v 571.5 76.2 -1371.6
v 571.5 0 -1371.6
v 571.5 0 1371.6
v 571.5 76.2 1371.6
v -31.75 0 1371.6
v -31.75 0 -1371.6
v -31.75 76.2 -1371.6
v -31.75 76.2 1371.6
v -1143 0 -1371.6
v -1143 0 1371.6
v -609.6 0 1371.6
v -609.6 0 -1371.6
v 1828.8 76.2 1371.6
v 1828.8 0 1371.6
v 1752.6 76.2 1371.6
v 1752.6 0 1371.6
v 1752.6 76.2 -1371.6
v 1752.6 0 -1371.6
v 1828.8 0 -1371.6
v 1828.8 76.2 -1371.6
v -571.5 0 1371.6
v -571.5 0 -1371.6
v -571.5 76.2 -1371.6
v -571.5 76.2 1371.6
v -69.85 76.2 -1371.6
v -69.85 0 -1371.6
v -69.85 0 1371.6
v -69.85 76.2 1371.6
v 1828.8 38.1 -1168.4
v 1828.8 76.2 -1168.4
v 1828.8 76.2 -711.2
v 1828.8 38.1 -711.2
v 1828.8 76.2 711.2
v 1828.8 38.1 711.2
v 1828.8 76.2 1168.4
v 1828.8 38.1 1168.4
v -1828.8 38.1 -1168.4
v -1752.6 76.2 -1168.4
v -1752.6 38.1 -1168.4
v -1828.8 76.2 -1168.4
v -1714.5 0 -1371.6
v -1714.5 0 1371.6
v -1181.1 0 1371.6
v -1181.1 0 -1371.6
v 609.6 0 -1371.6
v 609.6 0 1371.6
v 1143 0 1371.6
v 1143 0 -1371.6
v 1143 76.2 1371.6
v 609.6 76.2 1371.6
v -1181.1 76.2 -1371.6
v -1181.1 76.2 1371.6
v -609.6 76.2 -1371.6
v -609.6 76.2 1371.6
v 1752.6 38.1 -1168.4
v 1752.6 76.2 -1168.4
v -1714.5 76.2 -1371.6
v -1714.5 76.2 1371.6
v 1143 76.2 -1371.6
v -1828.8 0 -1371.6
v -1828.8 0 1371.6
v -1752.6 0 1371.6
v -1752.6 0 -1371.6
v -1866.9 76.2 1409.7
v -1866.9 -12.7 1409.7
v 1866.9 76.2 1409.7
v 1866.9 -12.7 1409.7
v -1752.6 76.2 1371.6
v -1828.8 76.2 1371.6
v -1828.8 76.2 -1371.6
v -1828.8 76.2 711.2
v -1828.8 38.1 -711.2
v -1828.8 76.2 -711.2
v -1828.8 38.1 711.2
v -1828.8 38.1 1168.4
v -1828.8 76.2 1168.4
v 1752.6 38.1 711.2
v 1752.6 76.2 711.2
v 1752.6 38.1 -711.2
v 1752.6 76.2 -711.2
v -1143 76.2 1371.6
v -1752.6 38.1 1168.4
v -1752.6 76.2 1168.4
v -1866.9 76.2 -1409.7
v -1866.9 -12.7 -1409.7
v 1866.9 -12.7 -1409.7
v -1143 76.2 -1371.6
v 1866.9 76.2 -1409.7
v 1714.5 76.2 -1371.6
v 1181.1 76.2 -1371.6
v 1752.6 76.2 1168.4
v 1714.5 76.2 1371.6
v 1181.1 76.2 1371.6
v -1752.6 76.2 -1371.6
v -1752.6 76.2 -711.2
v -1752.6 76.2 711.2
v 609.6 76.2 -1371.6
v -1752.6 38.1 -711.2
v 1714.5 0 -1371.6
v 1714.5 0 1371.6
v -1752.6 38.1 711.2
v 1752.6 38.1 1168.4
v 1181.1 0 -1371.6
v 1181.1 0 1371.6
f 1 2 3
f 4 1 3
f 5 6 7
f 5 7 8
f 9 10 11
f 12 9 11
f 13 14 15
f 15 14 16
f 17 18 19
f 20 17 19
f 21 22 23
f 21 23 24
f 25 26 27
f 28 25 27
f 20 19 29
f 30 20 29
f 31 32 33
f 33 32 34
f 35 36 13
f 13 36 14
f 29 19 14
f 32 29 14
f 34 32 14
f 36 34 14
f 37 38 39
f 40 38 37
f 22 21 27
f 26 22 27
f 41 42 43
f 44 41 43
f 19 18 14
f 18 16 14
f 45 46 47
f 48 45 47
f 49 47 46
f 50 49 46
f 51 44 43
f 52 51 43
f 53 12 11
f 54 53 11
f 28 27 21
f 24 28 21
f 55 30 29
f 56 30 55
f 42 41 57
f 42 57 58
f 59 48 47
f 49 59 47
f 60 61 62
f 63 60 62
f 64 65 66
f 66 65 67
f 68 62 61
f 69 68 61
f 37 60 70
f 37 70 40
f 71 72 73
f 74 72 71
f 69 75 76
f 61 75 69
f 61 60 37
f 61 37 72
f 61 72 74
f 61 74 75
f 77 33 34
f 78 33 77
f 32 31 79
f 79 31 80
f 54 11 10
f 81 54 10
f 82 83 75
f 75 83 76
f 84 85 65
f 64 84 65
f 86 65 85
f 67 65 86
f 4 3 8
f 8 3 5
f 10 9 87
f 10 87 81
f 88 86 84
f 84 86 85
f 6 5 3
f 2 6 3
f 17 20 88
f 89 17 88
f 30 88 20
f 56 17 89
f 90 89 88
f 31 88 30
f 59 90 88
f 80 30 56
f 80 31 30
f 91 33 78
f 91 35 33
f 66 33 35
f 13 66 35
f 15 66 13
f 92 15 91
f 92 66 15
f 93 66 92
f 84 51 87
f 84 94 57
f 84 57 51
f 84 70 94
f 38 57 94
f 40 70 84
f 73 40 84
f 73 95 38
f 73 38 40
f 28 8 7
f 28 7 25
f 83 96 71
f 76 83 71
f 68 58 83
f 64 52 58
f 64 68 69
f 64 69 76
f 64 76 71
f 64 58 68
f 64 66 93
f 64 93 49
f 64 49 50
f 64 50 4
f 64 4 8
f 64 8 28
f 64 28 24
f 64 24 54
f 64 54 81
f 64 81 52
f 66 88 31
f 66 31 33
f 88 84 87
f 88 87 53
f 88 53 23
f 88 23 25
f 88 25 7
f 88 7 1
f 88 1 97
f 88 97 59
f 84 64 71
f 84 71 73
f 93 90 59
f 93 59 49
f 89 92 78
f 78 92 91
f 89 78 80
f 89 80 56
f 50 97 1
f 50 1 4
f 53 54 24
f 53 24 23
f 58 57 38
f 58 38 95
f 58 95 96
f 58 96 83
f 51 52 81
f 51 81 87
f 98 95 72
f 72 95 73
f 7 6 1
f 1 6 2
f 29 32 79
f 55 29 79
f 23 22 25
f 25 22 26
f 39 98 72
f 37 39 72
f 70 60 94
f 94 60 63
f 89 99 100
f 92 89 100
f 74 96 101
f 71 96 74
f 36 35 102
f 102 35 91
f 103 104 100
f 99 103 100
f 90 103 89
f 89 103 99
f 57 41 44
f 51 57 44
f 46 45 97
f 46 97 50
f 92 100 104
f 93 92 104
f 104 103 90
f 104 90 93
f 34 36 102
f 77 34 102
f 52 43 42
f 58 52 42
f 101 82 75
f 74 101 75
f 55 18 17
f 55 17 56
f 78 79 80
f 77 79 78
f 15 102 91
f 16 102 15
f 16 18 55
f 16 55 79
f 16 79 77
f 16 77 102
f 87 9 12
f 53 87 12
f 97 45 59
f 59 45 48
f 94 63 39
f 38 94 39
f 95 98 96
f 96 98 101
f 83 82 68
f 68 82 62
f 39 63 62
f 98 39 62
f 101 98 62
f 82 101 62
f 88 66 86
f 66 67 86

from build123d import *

# Parameters (mm, degrees)
F0_W     = 3733.8
F0_H     = 2819.4
F1_DEPTH = 12.7
F2_W     = 38.1
F2_H     = 2743.2
F3_DEPTH = 76.2
F4_W     = 76.2
F4_H     = 457.2
F5_DEPTH = 38.1


with BuildPart() as f1:
    # F0 (on Front) → F1 (new body)
    with BuildSketch(Plane.XZ):
        Rectangle(F0_W, F0_H)
    extrude(amount=F1_DEPTH)

    # F2 (on face) → F3 (join)
    with BuildSketch(Plane(origin=(0, 0, 0), x_dir=(-1, 0, 0), z_dir=(0, 1, 0))):
        Polygon((1866.9, 1409.7), (-1866.9, 1409.7), (-1866.9, 1371.6), (-1828.8, 1371.6), (-1752.6, 1371.6), (-1714.5, 1371.6), (-1181.1, 1371.6), (-1143, 1371.6), (-609.6, 1371.6), (-571.5, 1371.6), (31.75, 1371.6), (69.85, 1371.6), (571.5, 1371.6), (609.6, 1371.6), (1143, 1371.6), (1181.1, 1371.6), (1714.5, 1371.6), (1752.6, 1371.6), (1828.8, 1371.6), (1866.9, 1371.6), align=None)
        with Locations((-1847.85, 0)):
            Rectangle(F2_W, F2_H)
        with Locations((1847.85, 0)):
            Rectangle(F2_W, F2_H)
        Polygon((-1828.8, -1371.6), (-1866.9, -1371.6), (-1866.9, -1409.7), (1866.9, -1409.7), (1866.9, -1371.6), (1828.8, -1371.6), (1752.6, -1371.6), (1714.5, -1371.6), (1181.1, -1371.6), (1143, -1371.6), (609.6, -1371.6), (571.5, -1371.6), (69.85, -1371.6), (31.75, -1371.6), (-571.5, -1371.6), (-609.6, -1371.6), (-1143, -1371.6), (-1181.1, -1371.6), (-1714.5, -1371.6), (-1752.6, -1371.6), align=None)
        with Locations((-1733.55, 0)):
            Rectangle(F2_W, F2_H)
        with Locations((-1162.05, 0)):
            Rectangle(F2_W, F2_H)
        with Locations((-590.55, 0)):
            Rectangle(F2_W, F2_H)
        with Locations((50.8, 0)):
            Rectangle(F2_W, F2_H)
        with Locations((590.55, 0)):
            Rectangle(F2_W, F2_H)
        with Locations((1162.05, 0)):
            Rectangle(F2_W, F2_H)
        with Locations((1733.55, 0)):
            Rectangle(F2_W, F2_H)
    extrude(amount=F3_DEPTH)

    # F4 (on face) → F5 (join)
    with BuildSketch(Plane(origin=(0, 76.2, 0), x_dir=(-1, 0, 0), z_dir=(0, 1, 0))):
        with Locations((-1790.7, 939.8)):
            Rectangle(F4_W, F4_H)
        with Locations((-1790.7, -939.8)):
            Rectangle(F4_W, F4_H)
        with Locations((1790.7, 939.8)):
            Rectangle(F4_W, F4_H)
        with Locations((1790.7, -939.8)):
            Rectangle(F4_W, F4_H)
    extrude(amount=-F5_DEPTH)


solid = f1.part
